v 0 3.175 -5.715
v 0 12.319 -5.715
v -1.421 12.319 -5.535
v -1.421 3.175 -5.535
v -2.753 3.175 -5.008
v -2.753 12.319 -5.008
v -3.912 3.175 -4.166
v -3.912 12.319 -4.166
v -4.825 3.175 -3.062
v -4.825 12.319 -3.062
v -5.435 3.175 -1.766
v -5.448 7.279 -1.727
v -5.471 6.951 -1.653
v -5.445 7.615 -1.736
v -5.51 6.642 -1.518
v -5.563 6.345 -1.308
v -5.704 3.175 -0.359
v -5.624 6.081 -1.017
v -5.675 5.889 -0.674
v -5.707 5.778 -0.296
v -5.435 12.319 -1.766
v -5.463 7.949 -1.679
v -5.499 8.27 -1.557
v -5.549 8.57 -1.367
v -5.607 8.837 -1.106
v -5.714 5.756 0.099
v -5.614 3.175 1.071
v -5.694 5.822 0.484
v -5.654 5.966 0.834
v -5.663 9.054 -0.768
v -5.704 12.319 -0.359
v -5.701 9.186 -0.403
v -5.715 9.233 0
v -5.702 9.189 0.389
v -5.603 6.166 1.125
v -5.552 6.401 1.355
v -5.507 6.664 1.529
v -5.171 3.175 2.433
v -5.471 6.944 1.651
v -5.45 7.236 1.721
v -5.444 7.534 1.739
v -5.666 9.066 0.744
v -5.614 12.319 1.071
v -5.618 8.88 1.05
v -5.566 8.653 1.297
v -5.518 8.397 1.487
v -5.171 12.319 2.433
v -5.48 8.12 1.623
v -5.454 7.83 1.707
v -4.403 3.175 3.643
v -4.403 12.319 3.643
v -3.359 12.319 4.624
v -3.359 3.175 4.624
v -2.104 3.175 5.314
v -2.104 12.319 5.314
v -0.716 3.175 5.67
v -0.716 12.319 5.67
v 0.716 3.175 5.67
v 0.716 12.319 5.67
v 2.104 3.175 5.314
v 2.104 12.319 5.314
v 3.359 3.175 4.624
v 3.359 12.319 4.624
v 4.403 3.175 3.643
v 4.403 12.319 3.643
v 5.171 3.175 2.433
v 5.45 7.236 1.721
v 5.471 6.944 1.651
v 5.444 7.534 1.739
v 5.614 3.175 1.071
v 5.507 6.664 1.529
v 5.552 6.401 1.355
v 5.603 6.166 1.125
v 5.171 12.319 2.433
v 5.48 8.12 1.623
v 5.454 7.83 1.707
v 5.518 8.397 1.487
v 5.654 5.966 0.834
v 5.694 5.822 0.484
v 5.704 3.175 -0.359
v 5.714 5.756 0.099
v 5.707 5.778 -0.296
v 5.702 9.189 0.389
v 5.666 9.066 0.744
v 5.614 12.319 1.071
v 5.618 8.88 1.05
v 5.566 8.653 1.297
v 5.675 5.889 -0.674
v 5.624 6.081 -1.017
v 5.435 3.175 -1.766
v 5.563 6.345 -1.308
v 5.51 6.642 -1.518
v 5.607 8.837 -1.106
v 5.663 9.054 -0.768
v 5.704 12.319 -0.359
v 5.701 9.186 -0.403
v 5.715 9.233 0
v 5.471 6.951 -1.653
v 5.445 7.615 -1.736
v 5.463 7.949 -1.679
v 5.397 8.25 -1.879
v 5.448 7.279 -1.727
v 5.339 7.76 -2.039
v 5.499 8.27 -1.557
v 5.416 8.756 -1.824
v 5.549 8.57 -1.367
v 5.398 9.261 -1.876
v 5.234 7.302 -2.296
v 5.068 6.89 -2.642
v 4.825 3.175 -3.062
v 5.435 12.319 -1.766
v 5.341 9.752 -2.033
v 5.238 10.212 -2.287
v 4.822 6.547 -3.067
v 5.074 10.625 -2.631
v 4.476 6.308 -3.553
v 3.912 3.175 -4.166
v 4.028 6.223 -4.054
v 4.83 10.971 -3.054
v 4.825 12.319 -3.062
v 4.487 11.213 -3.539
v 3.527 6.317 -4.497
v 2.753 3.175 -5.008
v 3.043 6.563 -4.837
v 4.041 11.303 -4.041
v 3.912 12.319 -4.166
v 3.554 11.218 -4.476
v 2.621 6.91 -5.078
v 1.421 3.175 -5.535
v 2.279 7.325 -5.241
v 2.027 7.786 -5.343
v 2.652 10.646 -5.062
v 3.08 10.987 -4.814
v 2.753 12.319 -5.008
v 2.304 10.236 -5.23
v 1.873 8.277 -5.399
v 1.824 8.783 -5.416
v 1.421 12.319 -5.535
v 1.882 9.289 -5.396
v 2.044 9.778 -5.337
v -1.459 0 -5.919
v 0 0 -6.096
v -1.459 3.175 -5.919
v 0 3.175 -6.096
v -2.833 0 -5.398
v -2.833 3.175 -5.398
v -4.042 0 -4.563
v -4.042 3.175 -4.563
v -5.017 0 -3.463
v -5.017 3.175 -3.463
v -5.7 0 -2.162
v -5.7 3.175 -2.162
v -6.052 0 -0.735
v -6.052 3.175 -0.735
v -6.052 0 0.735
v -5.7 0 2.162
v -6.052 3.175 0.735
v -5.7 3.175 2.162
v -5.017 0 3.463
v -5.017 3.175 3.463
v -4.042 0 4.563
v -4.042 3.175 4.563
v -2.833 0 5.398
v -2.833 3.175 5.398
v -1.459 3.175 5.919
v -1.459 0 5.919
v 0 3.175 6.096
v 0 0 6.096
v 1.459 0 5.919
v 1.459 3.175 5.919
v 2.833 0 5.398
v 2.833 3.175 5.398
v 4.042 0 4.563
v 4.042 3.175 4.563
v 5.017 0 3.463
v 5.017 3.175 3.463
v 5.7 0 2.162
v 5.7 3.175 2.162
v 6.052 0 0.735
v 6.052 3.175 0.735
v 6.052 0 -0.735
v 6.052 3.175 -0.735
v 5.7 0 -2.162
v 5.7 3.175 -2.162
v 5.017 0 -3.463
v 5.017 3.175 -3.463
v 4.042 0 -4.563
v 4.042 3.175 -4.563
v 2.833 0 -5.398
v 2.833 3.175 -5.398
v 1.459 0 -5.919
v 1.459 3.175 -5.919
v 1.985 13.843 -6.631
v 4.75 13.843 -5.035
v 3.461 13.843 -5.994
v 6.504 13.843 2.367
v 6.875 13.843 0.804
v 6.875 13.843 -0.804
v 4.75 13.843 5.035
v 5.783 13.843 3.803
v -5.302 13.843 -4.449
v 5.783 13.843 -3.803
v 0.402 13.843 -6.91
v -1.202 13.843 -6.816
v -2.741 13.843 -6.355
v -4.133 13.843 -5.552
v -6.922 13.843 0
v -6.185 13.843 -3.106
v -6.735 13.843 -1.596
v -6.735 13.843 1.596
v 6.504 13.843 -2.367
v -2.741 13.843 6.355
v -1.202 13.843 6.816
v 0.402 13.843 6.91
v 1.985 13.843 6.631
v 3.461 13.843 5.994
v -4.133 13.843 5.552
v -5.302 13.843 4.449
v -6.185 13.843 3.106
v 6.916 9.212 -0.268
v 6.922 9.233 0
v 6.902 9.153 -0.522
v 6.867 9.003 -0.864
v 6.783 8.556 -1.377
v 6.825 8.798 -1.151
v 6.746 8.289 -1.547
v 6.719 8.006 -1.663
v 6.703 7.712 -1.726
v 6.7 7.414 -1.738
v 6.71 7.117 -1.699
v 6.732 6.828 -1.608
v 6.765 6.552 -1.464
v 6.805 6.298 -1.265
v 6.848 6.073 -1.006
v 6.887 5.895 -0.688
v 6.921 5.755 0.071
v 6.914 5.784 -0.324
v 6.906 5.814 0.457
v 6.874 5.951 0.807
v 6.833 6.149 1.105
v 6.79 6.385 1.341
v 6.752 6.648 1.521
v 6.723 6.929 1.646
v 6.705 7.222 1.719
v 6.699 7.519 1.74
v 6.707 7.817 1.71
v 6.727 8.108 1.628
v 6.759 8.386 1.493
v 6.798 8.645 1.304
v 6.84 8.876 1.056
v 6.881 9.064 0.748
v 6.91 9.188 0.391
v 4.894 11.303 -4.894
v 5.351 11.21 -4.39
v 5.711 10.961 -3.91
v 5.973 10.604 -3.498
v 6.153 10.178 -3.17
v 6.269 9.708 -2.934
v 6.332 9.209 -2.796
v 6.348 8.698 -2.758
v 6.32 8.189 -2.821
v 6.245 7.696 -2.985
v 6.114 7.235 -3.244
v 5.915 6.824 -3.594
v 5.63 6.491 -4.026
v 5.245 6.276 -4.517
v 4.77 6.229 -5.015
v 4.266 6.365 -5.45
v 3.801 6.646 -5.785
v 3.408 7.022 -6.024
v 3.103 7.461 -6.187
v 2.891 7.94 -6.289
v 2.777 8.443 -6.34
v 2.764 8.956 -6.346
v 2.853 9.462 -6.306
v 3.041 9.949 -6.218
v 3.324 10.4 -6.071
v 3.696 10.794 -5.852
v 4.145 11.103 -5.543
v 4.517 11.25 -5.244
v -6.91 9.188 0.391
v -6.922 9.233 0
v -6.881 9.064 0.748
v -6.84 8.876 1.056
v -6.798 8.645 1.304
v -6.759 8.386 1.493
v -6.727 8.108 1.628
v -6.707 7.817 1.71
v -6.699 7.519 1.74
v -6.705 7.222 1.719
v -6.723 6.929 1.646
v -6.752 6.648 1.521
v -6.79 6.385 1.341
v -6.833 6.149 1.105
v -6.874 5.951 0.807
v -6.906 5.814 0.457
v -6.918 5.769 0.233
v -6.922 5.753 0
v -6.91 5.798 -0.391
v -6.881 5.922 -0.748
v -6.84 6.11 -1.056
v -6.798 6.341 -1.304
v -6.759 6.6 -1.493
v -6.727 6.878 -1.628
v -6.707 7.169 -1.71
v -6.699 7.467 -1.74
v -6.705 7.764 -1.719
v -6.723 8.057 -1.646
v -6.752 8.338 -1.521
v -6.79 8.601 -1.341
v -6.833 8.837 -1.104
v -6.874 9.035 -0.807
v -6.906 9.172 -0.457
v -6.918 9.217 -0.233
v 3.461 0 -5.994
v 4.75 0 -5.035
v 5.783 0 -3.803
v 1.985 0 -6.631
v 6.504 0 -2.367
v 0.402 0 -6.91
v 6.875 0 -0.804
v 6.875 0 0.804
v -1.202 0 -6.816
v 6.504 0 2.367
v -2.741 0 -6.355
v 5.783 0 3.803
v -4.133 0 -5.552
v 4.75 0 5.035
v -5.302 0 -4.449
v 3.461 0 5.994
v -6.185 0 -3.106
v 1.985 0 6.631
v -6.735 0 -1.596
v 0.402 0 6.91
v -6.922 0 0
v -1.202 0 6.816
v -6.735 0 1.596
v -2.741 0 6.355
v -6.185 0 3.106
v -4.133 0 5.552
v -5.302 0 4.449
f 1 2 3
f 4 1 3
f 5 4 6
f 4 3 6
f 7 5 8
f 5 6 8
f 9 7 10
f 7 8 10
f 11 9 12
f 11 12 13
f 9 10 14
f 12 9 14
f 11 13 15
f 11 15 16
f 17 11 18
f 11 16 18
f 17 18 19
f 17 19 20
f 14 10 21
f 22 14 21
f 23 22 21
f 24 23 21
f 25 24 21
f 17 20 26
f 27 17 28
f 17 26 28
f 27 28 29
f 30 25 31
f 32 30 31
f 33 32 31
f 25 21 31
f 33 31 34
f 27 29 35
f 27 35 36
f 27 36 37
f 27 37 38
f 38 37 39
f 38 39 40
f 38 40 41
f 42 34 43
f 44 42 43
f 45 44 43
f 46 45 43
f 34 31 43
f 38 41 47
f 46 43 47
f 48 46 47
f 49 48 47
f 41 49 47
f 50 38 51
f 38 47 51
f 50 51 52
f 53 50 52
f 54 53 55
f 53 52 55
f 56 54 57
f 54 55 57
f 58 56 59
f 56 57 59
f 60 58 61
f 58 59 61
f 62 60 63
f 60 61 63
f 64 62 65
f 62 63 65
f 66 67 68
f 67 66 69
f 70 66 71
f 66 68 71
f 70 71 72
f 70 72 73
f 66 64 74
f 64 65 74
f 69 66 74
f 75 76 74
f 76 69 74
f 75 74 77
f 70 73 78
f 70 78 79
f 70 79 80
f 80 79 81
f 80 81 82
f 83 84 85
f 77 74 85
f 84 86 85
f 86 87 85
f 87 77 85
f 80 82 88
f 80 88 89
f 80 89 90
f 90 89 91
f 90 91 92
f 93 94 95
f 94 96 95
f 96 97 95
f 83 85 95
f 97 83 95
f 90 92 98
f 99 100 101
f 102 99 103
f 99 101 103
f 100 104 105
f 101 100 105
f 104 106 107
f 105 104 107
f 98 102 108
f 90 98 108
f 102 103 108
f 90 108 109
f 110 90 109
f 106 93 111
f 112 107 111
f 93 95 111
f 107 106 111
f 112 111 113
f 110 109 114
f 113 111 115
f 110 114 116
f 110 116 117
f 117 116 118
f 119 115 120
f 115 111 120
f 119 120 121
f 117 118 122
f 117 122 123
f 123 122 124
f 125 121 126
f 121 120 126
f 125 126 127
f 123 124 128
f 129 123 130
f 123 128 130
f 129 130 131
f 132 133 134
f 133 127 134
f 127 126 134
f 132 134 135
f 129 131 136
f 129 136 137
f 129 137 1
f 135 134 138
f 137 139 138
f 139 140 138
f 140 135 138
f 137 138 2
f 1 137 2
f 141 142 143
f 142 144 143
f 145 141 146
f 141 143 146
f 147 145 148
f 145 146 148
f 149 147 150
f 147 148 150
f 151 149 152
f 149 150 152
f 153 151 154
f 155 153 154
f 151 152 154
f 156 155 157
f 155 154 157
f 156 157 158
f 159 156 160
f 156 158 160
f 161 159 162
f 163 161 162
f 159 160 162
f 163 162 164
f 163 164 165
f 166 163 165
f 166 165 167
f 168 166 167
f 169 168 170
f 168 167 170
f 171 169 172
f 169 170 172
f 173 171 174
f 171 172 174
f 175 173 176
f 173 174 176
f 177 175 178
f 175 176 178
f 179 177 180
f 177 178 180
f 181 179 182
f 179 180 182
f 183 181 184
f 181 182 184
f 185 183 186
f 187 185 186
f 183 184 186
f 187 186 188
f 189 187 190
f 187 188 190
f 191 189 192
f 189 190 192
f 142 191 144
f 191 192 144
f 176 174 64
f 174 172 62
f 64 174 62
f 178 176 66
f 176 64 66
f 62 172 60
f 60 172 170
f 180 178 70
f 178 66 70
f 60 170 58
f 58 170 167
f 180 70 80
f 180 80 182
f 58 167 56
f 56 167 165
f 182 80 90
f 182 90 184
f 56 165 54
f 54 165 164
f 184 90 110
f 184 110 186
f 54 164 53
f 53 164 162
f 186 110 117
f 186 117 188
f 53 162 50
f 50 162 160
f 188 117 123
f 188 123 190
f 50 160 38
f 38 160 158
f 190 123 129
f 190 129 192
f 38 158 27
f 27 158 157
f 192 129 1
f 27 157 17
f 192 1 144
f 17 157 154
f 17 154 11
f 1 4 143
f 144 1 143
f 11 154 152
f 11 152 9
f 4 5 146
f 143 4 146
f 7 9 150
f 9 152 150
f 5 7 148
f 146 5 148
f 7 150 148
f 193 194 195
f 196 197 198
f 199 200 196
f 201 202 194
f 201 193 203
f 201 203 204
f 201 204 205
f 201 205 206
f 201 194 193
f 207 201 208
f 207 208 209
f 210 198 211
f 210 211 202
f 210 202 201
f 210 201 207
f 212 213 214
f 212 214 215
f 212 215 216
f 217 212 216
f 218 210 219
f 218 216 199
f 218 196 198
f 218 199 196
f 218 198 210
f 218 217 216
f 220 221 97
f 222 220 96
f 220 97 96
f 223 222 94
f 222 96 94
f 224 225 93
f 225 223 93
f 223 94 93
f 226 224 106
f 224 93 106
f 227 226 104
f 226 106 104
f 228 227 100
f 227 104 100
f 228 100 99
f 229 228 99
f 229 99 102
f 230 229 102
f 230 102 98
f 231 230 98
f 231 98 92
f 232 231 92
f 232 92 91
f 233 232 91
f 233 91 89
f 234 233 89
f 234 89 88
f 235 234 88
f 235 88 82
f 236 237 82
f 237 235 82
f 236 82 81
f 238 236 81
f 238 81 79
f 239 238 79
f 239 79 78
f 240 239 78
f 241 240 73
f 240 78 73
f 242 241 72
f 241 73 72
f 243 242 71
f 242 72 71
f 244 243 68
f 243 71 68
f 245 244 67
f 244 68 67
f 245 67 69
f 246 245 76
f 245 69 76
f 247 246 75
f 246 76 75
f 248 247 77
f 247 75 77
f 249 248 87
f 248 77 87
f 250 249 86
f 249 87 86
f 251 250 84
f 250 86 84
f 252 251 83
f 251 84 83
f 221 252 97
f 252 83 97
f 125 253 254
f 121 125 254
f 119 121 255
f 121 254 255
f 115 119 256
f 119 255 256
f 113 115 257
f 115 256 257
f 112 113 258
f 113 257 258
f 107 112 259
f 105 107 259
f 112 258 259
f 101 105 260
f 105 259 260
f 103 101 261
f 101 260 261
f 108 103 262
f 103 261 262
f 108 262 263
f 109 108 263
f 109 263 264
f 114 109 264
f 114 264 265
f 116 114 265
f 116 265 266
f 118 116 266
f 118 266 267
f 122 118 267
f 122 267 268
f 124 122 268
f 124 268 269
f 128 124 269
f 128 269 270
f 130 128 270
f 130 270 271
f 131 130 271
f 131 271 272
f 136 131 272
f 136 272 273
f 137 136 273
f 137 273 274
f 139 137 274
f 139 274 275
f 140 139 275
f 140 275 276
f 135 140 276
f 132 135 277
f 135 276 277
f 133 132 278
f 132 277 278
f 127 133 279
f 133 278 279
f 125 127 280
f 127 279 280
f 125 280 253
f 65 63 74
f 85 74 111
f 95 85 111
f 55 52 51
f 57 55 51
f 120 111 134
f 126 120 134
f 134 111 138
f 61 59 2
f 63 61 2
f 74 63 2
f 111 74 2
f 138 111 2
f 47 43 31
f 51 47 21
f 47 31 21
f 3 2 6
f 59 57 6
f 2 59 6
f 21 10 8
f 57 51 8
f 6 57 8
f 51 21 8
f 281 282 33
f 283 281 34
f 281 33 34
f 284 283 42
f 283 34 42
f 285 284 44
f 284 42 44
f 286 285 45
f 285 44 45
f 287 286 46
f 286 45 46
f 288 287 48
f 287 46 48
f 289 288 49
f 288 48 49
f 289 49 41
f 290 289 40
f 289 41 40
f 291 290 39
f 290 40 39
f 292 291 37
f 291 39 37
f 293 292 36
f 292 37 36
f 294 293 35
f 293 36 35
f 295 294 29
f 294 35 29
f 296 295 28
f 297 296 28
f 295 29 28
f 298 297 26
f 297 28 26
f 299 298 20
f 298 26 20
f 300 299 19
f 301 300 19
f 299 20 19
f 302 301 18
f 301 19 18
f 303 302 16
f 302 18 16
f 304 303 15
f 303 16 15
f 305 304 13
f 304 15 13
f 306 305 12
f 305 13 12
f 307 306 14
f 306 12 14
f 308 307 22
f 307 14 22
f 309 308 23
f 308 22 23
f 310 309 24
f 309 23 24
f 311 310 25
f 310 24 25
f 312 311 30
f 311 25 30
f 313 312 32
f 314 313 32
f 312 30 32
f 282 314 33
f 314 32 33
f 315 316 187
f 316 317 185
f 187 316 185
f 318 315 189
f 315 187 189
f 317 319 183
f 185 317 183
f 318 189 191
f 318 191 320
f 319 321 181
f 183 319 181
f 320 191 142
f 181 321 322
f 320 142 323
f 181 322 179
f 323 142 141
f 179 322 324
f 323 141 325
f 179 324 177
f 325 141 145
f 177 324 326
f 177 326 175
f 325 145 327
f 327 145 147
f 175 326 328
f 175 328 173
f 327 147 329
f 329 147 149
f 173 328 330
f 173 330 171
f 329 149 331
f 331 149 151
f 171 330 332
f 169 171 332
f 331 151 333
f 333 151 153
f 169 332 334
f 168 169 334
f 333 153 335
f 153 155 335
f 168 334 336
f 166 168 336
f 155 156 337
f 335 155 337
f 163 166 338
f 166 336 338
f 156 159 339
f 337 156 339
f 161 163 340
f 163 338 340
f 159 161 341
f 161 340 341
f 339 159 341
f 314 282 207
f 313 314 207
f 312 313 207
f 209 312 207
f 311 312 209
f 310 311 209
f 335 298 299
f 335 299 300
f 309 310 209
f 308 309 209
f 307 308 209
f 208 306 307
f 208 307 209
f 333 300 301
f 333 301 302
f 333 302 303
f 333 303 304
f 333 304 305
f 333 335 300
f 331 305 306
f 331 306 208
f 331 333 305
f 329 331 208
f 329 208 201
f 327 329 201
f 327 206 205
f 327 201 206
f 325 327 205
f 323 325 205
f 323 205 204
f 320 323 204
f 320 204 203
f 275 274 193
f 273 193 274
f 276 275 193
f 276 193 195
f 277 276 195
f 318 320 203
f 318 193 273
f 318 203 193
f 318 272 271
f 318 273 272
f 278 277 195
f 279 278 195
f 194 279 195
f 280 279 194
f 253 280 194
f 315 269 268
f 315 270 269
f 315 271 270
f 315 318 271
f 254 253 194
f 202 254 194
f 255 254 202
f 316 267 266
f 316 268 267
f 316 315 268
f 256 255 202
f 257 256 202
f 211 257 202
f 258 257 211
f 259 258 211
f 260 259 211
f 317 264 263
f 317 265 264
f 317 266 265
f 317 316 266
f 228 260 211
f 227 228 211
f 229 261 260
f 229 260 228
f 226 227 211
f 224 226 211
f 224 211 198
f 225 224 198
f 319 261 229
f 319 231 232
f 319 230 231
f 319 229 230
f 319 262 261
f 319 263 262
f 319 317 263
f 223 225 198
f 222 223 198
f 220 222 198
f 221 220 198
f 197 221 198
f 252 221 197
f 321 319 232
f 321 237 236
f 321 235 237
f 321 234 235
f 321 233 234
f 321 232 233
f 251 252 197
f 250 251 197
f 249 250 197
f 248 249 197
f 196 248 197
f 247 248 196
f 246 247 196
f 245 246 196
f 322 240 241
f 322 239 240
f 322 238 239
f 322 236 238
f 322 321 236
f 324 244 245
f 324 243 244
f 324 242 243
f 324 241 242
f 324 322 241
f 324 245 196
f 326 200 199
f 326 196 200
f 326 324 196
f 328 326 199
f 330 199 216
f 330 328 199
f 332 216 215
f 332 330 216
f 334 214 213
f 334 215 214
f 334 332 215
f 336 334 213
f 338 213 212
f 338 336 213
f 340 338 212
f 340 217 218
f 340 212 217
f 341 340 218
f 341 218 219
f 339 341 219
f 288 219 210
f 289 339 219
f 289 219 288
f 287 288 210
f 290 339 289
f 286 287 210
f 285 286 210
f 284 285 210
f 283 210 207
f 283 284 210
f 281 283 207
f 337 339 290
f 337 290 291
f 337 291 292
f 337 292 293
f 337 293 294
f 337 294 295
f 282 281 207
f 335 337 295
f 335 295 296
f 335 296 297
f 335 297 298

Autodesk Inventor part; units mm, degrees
ref_plane "YZ Plane" through (0, 0, 0) normal (1, 0, 0) x (0, 1, 0)
ref_plane "XZ Plane" through (0, 0, 0) normal (0, 1, 0) x (-1, 0, 0)
ref_plane "XY Plane" through (0, 0, 0) normal (0, 0, 1) x (1, 0, 0)
sketch "Sketch1" plane through (0, 0, 0) normal (0, 1, 0) x (-1, 0, 0)
  circle A0 centre (0, 0) radius 6.9215
  dimension "d0" = 13.843
extrude "Extrusion1" add sketch "Sketch1" along normal blind 13.843
hole "Hole2" at (0, 0, 0) direction (0, 1, 0) diameter 12.192 depth 3.175
hole "Hole1" at (0, 3.175, 0) direction (0, 1, 0) diameter 11.43 depth 9.144
sketch "Sketch2" plane through (0, 0, 0) normal (1, 0, 0) x (0, 1, 0)
  line L0 (13.843, -6.9215) -> (13.843, 6.9215) projected
  line L1 (13.843, 0) -> (7.493, 0)
  circle A0 centre (7.493, 0) radius 1.7399
  point P0 (0, 0)
  dimension "d21" = 6.35
  dimension "d22" = 3.4798
extrude "Extrusion2" cut sketch "Sketch2" along normal through all both and the other way through all
sketch "Workplane Control Sketch" plane through (0, 13.843, 0) normal (0, 1, 0) x (1, 0, 0)
  circle A0 centre (0, 0) radius 6.9215
  line L0 (0, 0) -> (4.89424, 4.89424)
  line L1 (0, 0) -> (0, 6.9215) construction
  dimension "d25" = 45
ref_plane "Work Plane1" through (4.89424, 13.843, -4.89424) normal (0.7071068, 0, -0.7071068) x (0, 1, 0)
sketch "Sketch4" plane through (4.89424, 13.843, -4.89424) normal (0.7071068, 0, -0.7071068) x (0, 1, 0)
  line L0 (0, 0) -> (-5.08, 0)
  circle A0 centre (-5.08, 0) radius 2.54
  point P0 (-13.843, 0)
  dimension "d26" = 5.08
  dimension "d27" = 5.08
extrude "Extrusion3" cut sketch "Sketch4" against normal up to next
properties part number "Piston" material "Aluminum 6061"
